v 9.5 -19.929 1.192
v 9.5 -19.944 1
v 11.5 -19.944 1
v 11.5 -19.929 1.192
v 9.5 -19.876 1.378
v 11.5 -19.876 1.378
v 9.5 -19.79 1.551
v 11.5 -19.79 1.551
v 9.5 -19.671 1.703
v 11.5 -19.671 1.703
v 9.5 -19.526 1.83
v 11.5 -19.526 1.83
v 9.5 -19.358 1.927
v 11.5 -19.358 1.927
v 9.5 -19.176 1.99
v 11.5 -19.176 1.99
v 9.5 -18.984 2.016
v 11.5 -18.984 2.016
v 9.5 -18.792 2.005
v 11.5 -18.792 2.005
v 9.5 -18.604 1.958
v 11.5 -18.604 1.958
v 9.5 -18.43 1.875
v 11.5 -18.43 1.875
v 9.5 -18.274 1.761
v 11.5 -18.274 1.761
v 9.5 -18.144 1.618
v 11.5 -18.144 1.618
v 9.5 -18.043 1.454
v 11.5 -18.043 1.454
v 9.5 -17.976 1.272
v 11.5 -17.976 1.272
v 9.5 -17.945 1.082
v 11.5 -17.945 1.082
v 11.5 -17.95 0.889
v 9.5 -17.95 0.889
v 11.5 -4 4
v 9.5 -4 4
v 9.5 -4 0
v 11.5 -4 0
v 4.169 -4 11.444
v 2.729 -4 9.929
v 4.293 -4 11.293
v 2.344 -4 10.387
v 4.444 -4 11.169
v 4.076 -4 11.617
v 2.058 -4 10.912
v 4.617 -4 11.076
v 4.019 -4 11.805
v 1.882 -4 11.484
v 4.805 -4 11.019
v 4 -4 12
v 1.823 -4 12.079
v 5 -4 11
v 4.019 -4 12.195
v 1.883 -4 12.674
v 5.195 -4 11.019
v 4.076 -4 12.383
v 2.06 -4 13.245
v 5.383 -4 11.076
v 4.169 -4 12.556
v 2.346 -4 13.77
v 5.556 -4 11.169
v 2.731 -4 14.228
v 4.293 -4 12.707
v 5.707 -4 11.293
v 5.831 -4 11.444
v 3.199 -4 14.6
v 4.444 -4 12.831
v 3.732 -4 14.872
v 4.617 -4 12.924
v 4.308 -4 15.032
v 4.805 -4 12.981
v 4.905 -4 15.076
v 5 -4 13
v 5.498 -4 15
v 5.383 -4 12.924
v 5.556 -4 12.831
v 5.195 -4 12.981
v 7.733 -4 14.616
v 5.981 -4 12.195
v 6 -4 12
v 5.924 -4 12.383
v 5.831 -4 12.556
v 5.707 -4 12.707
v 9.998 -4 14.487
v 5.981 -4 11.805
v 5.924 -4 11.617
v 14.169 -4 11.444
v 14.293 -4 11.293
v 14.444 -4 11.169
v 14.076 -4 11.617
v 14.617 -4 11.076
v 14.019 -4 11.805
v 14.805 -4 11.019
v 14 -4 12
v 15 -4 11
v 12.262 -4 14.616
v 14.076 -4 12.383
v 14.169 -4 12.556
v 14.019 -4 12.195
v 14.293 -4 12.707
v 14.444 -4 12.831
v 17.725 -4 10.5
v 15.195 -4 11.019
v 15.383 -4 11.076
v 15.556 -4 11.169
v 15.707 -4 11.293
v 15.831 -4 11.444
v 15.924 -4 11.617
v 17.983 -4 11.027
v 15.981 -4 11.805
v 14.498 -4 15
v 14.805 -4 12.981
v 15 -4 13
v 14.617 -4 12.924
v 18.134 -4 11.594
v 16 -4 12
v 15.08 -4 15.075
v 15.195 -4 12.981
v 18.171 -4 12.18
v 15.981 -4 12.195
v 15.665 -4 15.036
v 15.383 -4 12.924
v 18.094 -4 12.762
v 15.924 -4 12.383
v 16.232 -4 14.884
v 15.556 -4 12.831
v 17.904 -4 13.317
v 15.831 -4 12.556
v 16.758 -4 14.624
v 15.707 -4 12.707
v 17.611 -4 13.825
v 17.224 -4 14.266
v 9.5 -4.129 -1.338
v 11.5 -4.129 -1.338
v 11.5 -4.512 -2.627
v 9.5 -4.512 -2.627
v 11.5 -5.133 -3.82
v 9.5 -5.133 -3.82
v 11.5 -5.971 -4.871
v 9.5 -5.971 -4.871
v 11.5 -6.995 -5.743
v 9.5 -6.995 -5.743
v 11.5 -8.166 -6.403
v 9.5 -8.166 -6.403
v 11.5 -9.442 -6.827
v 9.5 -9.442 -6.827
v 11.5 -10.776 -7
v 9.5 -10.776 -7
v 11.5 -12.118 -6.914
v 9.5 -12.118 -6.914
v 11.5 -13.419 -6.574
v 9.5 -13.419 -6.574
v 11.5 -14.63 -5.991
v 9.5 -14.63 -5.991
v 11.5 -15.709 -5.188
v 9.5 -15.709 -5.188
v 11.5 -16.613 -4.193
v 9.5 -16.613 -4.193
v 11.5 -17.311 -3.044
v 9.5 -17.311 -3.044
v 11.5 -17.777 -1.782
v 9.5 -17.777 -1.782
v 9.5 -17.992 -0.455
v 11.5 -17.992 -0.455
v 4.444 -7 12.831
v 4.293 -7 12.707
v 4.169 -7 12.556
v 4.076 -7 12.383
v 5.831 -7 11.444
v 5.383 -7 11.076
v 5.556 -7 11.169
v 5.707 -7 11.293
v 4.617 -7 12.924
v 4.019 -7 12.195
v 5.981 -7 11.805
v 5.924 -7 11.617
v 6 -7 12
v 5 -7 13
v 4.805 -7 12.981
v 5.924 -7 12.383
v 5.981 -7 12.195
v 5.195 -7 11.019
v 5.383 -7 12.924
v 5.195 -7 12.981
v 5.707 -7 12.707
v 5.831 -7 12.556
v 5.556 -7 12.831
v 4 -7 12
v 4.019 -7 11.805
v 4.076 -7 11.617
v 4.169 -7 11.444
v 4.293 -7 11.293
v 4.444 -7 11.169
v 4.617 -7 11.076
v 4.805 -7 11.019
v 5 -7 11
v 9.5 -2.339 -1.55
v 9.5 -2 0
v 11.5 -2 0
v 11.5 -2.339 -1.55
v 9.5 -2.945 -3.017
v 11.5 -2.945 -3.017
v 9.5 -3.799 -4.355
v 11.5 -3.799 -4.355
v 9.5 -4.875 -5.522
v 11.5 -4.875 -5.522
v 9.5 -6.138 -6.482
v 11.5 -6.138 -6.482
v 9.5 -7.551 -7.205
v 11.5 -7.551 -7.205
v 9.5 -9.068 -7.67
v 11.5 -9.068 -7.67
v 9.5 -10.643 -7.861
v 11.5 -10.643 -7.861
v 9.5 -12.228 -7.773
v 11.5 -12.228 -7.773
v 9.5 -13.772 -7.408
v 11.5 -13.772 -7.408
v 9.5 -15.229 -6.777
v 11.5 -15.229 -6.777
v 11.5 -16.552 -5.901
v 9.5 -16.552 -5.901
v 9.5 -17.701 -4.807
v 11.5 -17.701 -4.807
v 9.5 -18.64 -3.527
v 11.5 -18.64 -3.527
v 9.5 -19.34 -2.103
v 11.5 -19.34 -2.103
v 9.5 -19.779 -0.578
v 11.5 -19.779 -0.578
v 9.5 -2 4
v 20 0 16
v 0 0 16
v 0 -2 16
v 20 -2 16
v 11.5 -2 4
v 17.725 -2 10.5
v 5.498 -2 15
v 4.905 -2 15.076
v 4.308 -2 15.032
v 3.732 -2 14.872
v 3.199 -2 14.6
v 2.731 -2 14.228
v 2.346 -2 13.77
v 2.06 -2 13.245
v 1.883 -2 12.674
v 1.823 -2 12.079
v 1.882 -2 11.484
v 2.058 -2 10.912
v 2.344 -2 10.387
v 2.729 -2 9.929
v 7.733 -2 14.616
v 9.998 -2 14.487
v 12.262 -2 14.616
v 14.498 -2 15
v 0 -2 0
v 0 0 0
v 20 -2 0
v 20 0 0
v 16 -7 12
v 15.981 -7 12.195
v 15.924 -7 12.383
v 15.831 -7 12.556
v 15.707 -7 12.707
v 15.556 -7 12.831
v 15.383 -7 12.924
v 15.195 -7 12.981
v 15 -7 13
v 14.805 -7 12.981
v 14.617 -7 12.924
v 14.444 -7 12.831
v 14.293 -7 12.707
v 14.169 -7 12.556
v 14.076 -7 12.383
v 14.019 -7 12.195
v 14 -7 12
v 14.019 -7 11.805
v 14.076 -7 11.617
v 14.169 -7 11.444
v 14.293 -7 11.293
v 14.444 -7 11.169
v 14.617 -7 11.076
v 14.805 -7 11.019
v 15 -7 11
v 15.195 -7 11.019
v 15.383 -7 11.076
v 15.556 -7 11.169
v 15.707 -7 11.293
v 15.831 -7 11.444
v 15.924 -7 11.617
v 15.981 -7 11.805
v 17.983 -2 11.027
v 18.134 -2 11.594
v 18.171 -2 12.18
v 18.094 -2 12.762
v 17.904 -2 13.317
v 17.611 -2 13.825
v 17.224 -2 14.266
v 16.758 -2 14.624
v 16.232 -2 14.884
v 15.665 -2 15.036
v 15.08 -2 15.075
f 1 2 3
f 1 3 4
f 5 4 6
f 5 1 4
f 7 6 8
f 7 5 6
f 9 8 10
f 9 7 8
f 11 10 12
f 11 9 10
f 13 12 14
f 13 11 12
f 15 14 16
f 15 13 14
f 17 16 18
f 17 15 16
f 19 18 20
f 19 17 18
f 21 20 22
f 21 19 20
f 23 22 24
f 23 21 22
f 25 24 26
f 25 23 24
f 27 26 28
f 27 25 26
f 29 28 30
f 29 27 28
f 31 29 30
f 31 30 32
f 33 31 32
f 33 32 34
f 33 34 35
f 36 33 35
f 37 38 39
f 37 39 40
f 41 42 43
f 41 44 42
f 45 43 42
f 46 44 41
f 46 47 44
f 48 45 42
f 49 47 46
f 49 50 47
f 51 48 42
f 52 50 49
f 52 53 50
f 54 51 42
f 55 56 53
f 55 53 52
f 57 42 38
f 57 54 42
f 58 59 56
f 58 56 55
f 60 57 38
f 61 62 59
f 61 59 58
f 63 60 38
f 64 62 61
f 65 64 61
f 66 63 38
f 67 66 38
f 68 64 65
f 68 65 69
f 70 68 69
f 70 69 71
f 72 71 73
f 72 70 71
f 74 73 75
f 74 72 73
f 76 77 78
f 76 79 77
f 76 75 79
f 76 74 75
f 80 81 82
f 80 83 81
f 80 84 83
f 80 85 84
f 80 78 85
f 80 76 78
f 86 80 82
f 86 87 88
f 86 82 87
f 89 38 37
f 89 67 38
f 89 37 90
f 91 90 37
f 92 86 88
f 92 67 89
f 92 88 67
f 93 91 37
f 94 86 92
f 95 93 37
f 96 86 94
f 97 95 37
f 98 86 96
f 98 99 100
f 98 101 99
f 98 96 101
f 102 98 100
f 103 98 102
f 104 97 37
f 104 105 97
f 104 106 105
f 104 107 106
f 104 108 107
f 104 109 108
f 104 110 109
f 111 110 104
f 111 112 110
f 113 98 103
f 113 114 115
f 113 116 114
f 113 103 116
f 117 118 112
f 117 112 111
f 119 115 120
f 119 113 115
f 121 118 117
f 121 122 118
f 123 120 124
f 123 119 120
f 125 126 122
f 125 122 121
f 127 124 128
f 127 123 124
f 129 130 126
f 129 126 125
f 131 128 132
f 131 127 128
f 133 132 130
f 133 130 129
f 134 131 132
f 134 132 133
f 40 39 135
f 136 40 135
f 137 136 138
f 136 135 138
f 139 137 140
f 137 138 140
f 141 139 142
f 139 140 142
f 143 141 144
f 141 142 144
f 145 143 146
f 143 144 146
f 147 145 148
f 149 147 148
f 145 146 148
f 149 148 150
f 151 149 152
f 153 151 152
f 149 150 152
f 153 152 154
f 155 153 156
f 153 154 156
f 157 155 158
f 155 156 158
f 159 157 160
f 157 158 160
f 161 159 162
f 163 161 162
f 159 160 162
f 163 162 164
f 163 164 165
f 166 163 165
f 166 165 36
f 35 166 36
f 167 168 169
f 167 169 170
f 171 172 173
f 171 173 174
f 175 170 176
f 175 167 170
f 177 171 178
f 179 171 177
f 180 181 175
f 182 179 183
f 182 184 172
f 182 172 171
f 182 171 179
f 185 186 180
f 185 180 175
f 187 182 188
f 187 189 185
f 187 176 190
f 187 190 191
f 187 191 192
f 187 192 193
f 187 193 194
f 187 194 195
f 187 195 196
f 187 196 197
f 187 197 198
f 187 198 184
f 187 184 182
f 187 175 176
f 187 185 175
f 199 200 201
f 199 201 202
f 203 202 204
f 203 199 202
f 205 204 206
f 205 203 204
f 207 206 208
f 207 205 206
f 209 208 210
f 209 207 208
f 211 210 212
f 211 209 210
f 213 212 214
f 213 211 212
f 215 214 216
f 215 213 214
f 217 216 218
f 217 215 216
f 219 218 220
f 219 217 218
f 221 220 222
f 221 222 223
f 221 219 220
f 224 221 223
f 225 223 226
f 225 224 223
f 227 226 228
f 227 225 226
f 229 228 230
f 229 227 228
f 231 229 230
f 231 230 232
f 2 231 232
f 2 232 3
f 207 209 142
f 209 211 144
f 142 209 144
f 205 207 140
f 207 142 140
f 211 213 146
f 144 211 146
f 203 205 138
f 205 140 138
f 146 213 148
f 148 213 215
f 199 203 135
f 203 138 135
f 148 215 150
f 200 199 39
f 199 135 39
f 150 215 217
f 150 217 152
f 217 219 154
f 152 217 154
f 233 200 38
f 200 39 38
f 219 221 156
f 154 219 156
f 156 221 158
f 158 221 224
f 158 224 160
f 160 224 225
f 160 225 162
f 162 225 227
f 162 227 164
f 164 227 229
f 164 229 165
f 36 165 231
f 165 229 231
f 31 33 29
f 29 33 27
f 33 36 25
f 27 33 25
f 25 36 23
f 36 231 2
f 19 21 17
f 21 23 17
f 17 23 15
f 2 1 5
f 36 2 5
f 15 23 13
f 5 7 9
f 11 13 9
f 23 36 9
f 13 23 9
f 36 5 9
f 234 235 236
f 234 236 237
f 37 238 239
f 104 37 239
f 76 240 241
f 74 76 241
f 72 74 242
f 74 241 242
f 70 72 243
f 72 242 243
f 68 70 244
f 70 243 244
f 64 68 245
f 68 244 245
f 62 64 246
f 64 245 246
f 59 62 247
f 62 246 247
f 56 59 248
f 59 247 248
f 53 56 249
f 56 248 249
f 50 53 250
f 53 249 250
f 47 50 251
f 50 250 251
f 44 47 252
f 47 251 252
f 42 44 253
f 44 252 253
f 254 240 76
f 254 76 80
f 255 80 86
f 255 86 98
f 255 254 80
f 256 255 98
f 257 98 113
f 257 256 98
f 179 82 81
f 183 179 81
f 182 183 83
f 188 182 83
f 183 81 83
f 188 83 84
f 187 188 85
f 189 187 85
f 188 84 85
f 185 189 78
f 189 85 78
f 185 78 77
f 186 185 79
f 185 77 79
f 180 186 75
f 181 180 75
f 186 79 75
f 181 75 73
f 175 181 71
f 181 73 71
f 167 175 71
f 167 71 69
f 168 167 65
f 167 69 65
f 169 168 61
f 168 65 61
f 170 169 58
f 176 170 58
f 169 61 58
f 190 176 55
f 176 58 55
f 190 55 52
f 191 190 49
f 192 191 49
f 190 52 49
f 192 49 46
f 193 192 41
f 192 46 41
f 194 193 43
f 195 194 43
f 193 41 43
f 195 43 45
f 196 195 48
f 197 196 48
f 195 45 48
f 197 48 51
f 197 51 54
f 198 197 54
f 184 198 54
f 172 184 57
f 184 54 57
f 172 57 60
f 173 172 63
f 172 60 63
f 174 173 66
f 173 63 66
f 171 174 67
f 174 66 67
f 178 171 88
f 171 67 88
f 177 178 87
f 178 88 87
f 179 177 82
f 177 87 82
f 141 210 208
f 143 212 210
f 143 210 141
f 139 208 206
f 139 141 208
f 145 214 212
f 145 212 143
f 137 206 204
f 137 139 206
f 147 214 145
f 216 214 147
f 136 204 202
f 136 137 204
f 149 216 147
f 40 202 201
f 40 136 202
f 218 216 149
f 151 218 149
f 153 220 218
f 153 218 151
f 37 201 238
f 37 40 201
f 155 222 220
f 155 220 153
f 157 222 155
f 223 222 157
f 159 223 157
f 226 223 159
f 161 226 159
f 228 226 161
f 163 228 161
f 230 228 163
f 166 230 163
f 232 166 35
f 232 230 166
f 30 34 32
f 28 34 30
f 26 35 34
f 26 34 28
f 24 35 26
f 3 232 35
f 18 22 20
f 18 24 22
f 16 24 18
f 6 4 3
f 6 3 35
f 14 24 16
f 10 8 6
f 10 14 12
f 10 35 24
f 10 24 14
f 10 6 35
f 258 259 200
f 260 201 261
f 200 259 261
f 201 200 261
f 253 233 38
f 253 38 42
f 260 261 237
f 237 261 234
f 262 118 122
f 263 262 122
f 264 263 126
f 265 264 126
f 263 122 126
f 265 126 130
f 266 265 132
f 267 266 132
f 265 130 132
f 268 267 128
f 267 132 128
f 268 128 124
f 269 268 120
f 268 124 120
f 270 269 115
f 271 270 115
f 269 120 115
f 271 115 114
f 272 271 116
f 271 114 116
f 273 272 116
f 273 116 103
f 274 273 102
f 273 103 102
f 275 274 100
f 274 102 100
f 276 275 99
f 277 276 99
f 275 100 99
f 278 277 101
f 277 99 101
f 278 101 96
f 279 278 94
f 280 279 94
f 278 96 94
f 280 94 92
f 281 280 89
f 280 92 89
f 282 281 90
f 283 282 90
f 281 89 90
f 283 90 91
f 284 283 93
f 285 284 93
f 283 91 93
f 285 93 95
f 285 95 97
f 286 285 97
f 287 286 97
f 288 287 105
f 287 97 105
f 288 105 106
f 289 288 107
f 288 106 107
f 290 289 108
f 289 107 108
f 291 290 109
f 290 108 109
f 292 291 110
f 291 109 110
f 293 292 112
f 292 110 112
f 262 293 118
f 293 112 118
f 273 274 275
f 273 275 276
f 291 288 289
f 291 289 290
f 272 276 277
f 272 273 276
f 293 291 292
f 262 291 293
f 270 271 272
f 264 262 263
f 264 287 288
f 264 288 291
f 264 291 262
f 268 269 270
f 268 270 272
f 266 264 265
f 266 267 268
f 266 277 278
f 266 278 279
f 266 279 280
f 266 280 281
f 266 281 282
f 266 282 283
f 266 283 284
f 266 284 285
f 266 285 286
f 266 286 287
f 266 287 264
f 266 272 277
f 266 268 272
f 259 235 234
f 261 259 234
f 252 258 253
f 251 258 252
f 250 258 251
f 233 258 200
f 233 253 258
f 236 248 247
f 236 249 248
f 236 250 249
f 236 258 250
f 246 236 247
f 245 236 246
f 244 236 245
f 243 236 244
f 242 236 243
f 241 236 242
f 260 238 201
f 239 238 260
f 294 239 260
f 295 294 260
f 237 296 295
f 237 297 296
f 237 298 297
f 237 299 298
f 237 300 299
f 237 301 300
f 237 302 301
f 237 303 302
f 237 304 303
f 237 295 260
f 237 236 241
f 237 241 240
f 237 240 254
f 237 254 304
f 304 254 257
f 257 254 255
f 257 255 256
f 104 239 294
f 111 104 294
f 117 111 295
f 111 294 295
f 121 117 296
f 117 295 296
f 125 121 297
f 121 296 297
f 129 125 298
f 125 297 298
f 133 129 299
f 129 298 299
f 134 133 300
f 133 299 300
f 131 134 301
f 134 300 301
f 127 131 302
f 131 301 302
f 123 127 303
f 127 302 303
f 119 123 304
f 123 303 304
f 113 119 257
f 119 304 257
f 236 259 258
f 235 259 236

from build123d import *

# Parameters (mm, degrees)
SKETCH_W     = 20
SKETCH_H     = 16
PAD_DEPTH    = 2
PAD001_DEPTH = 2
SKETCH004_R  = 1
PAD002_DEPTH = 3
SKETCH005_W  = 2
SKETCH005_H  = 1
PAD003_DEPTH = 2
PAD004_DEPTH = 2


with BuildPart() as part:
    # Sketch → Pad (new body)
    with BuildSketch(Plane.XZ):
        with Locations((10, 8)):
            Rectangle(SKETCH_W, SKETCH_H)
    extrude(amount=PAD_DEPTH)

    # Sketch001 (on Face6 of Pad) → Pad001 (join)
    with BuildSketch(Plane.XZ.offset(2)):
        with BuildLine():
            ThreePointArc((17.72495, 10.5), (17.610738, 13.825239), (14.497831, 15))
            ThreePointArc((5.497831, 15), (9.997831, 14.487175), (14.497831, 15))
            ThreePointArc((5.497831, 15), (2.18979, 13.514663), (2.728727, 9.928732))
            Line((9.5, 4), (2.728727, 9.928732))
            Line((9.5, 4), (9.5, 1))
            Line((9.5, 1), (11.5, 1))
            Line((11.5, 1), (11.5, 4))
            Line((11.5, 4), (17.72495, 10.5))
        make_face()
    extrude(amount=PAD001_DEPTH)

    # Sketch004 (on Face15 of Pad001) → Pad002 (join)
    with BuildSketch(Plane.XZ.offset(4)):
        with Locations((5, 12)):
            Circle(SKETCH004_R)
        with Locations((15, 12)):
            Circle(SKETCH004_R)
    extrude(amount=PAD002_DEPTH)

    # Sketch005 (on Face5 of Pad002) → Pad003 (join)
    with BuildSketch(Plane.XZ.offset(2)):
        with Locations((10.5, 0.5)):
            Rectangle(SKETCH005_W, SKETCH005_H)
    extrude(amount=PAD003_DEPTH)

    # Sketch006 (on Face12 of Pad003) → Pad004 (join)
    with BuildSketch(Plane(origin=(9.5, 0, 0), x_dir=(0, 0, -1), z_dir=(-1, 0, 0))):
        with BuildLine():
            Line((0, 2), (0, 4))
            ThreePointArc((0, 4), (6.989376, 11.448896), (-0.888889, 17.950464))
            ThreePointArc((-1, 19.944272), (-2.015402, 18.887686), (-0.888889, 17.950464))
            ThreePointArc((0, 2), (7.851742, 11.437563), (-1, 19.944272))
        make_face()
    extrude(amount=-PAD004_DEPTH)


solid = part.part
